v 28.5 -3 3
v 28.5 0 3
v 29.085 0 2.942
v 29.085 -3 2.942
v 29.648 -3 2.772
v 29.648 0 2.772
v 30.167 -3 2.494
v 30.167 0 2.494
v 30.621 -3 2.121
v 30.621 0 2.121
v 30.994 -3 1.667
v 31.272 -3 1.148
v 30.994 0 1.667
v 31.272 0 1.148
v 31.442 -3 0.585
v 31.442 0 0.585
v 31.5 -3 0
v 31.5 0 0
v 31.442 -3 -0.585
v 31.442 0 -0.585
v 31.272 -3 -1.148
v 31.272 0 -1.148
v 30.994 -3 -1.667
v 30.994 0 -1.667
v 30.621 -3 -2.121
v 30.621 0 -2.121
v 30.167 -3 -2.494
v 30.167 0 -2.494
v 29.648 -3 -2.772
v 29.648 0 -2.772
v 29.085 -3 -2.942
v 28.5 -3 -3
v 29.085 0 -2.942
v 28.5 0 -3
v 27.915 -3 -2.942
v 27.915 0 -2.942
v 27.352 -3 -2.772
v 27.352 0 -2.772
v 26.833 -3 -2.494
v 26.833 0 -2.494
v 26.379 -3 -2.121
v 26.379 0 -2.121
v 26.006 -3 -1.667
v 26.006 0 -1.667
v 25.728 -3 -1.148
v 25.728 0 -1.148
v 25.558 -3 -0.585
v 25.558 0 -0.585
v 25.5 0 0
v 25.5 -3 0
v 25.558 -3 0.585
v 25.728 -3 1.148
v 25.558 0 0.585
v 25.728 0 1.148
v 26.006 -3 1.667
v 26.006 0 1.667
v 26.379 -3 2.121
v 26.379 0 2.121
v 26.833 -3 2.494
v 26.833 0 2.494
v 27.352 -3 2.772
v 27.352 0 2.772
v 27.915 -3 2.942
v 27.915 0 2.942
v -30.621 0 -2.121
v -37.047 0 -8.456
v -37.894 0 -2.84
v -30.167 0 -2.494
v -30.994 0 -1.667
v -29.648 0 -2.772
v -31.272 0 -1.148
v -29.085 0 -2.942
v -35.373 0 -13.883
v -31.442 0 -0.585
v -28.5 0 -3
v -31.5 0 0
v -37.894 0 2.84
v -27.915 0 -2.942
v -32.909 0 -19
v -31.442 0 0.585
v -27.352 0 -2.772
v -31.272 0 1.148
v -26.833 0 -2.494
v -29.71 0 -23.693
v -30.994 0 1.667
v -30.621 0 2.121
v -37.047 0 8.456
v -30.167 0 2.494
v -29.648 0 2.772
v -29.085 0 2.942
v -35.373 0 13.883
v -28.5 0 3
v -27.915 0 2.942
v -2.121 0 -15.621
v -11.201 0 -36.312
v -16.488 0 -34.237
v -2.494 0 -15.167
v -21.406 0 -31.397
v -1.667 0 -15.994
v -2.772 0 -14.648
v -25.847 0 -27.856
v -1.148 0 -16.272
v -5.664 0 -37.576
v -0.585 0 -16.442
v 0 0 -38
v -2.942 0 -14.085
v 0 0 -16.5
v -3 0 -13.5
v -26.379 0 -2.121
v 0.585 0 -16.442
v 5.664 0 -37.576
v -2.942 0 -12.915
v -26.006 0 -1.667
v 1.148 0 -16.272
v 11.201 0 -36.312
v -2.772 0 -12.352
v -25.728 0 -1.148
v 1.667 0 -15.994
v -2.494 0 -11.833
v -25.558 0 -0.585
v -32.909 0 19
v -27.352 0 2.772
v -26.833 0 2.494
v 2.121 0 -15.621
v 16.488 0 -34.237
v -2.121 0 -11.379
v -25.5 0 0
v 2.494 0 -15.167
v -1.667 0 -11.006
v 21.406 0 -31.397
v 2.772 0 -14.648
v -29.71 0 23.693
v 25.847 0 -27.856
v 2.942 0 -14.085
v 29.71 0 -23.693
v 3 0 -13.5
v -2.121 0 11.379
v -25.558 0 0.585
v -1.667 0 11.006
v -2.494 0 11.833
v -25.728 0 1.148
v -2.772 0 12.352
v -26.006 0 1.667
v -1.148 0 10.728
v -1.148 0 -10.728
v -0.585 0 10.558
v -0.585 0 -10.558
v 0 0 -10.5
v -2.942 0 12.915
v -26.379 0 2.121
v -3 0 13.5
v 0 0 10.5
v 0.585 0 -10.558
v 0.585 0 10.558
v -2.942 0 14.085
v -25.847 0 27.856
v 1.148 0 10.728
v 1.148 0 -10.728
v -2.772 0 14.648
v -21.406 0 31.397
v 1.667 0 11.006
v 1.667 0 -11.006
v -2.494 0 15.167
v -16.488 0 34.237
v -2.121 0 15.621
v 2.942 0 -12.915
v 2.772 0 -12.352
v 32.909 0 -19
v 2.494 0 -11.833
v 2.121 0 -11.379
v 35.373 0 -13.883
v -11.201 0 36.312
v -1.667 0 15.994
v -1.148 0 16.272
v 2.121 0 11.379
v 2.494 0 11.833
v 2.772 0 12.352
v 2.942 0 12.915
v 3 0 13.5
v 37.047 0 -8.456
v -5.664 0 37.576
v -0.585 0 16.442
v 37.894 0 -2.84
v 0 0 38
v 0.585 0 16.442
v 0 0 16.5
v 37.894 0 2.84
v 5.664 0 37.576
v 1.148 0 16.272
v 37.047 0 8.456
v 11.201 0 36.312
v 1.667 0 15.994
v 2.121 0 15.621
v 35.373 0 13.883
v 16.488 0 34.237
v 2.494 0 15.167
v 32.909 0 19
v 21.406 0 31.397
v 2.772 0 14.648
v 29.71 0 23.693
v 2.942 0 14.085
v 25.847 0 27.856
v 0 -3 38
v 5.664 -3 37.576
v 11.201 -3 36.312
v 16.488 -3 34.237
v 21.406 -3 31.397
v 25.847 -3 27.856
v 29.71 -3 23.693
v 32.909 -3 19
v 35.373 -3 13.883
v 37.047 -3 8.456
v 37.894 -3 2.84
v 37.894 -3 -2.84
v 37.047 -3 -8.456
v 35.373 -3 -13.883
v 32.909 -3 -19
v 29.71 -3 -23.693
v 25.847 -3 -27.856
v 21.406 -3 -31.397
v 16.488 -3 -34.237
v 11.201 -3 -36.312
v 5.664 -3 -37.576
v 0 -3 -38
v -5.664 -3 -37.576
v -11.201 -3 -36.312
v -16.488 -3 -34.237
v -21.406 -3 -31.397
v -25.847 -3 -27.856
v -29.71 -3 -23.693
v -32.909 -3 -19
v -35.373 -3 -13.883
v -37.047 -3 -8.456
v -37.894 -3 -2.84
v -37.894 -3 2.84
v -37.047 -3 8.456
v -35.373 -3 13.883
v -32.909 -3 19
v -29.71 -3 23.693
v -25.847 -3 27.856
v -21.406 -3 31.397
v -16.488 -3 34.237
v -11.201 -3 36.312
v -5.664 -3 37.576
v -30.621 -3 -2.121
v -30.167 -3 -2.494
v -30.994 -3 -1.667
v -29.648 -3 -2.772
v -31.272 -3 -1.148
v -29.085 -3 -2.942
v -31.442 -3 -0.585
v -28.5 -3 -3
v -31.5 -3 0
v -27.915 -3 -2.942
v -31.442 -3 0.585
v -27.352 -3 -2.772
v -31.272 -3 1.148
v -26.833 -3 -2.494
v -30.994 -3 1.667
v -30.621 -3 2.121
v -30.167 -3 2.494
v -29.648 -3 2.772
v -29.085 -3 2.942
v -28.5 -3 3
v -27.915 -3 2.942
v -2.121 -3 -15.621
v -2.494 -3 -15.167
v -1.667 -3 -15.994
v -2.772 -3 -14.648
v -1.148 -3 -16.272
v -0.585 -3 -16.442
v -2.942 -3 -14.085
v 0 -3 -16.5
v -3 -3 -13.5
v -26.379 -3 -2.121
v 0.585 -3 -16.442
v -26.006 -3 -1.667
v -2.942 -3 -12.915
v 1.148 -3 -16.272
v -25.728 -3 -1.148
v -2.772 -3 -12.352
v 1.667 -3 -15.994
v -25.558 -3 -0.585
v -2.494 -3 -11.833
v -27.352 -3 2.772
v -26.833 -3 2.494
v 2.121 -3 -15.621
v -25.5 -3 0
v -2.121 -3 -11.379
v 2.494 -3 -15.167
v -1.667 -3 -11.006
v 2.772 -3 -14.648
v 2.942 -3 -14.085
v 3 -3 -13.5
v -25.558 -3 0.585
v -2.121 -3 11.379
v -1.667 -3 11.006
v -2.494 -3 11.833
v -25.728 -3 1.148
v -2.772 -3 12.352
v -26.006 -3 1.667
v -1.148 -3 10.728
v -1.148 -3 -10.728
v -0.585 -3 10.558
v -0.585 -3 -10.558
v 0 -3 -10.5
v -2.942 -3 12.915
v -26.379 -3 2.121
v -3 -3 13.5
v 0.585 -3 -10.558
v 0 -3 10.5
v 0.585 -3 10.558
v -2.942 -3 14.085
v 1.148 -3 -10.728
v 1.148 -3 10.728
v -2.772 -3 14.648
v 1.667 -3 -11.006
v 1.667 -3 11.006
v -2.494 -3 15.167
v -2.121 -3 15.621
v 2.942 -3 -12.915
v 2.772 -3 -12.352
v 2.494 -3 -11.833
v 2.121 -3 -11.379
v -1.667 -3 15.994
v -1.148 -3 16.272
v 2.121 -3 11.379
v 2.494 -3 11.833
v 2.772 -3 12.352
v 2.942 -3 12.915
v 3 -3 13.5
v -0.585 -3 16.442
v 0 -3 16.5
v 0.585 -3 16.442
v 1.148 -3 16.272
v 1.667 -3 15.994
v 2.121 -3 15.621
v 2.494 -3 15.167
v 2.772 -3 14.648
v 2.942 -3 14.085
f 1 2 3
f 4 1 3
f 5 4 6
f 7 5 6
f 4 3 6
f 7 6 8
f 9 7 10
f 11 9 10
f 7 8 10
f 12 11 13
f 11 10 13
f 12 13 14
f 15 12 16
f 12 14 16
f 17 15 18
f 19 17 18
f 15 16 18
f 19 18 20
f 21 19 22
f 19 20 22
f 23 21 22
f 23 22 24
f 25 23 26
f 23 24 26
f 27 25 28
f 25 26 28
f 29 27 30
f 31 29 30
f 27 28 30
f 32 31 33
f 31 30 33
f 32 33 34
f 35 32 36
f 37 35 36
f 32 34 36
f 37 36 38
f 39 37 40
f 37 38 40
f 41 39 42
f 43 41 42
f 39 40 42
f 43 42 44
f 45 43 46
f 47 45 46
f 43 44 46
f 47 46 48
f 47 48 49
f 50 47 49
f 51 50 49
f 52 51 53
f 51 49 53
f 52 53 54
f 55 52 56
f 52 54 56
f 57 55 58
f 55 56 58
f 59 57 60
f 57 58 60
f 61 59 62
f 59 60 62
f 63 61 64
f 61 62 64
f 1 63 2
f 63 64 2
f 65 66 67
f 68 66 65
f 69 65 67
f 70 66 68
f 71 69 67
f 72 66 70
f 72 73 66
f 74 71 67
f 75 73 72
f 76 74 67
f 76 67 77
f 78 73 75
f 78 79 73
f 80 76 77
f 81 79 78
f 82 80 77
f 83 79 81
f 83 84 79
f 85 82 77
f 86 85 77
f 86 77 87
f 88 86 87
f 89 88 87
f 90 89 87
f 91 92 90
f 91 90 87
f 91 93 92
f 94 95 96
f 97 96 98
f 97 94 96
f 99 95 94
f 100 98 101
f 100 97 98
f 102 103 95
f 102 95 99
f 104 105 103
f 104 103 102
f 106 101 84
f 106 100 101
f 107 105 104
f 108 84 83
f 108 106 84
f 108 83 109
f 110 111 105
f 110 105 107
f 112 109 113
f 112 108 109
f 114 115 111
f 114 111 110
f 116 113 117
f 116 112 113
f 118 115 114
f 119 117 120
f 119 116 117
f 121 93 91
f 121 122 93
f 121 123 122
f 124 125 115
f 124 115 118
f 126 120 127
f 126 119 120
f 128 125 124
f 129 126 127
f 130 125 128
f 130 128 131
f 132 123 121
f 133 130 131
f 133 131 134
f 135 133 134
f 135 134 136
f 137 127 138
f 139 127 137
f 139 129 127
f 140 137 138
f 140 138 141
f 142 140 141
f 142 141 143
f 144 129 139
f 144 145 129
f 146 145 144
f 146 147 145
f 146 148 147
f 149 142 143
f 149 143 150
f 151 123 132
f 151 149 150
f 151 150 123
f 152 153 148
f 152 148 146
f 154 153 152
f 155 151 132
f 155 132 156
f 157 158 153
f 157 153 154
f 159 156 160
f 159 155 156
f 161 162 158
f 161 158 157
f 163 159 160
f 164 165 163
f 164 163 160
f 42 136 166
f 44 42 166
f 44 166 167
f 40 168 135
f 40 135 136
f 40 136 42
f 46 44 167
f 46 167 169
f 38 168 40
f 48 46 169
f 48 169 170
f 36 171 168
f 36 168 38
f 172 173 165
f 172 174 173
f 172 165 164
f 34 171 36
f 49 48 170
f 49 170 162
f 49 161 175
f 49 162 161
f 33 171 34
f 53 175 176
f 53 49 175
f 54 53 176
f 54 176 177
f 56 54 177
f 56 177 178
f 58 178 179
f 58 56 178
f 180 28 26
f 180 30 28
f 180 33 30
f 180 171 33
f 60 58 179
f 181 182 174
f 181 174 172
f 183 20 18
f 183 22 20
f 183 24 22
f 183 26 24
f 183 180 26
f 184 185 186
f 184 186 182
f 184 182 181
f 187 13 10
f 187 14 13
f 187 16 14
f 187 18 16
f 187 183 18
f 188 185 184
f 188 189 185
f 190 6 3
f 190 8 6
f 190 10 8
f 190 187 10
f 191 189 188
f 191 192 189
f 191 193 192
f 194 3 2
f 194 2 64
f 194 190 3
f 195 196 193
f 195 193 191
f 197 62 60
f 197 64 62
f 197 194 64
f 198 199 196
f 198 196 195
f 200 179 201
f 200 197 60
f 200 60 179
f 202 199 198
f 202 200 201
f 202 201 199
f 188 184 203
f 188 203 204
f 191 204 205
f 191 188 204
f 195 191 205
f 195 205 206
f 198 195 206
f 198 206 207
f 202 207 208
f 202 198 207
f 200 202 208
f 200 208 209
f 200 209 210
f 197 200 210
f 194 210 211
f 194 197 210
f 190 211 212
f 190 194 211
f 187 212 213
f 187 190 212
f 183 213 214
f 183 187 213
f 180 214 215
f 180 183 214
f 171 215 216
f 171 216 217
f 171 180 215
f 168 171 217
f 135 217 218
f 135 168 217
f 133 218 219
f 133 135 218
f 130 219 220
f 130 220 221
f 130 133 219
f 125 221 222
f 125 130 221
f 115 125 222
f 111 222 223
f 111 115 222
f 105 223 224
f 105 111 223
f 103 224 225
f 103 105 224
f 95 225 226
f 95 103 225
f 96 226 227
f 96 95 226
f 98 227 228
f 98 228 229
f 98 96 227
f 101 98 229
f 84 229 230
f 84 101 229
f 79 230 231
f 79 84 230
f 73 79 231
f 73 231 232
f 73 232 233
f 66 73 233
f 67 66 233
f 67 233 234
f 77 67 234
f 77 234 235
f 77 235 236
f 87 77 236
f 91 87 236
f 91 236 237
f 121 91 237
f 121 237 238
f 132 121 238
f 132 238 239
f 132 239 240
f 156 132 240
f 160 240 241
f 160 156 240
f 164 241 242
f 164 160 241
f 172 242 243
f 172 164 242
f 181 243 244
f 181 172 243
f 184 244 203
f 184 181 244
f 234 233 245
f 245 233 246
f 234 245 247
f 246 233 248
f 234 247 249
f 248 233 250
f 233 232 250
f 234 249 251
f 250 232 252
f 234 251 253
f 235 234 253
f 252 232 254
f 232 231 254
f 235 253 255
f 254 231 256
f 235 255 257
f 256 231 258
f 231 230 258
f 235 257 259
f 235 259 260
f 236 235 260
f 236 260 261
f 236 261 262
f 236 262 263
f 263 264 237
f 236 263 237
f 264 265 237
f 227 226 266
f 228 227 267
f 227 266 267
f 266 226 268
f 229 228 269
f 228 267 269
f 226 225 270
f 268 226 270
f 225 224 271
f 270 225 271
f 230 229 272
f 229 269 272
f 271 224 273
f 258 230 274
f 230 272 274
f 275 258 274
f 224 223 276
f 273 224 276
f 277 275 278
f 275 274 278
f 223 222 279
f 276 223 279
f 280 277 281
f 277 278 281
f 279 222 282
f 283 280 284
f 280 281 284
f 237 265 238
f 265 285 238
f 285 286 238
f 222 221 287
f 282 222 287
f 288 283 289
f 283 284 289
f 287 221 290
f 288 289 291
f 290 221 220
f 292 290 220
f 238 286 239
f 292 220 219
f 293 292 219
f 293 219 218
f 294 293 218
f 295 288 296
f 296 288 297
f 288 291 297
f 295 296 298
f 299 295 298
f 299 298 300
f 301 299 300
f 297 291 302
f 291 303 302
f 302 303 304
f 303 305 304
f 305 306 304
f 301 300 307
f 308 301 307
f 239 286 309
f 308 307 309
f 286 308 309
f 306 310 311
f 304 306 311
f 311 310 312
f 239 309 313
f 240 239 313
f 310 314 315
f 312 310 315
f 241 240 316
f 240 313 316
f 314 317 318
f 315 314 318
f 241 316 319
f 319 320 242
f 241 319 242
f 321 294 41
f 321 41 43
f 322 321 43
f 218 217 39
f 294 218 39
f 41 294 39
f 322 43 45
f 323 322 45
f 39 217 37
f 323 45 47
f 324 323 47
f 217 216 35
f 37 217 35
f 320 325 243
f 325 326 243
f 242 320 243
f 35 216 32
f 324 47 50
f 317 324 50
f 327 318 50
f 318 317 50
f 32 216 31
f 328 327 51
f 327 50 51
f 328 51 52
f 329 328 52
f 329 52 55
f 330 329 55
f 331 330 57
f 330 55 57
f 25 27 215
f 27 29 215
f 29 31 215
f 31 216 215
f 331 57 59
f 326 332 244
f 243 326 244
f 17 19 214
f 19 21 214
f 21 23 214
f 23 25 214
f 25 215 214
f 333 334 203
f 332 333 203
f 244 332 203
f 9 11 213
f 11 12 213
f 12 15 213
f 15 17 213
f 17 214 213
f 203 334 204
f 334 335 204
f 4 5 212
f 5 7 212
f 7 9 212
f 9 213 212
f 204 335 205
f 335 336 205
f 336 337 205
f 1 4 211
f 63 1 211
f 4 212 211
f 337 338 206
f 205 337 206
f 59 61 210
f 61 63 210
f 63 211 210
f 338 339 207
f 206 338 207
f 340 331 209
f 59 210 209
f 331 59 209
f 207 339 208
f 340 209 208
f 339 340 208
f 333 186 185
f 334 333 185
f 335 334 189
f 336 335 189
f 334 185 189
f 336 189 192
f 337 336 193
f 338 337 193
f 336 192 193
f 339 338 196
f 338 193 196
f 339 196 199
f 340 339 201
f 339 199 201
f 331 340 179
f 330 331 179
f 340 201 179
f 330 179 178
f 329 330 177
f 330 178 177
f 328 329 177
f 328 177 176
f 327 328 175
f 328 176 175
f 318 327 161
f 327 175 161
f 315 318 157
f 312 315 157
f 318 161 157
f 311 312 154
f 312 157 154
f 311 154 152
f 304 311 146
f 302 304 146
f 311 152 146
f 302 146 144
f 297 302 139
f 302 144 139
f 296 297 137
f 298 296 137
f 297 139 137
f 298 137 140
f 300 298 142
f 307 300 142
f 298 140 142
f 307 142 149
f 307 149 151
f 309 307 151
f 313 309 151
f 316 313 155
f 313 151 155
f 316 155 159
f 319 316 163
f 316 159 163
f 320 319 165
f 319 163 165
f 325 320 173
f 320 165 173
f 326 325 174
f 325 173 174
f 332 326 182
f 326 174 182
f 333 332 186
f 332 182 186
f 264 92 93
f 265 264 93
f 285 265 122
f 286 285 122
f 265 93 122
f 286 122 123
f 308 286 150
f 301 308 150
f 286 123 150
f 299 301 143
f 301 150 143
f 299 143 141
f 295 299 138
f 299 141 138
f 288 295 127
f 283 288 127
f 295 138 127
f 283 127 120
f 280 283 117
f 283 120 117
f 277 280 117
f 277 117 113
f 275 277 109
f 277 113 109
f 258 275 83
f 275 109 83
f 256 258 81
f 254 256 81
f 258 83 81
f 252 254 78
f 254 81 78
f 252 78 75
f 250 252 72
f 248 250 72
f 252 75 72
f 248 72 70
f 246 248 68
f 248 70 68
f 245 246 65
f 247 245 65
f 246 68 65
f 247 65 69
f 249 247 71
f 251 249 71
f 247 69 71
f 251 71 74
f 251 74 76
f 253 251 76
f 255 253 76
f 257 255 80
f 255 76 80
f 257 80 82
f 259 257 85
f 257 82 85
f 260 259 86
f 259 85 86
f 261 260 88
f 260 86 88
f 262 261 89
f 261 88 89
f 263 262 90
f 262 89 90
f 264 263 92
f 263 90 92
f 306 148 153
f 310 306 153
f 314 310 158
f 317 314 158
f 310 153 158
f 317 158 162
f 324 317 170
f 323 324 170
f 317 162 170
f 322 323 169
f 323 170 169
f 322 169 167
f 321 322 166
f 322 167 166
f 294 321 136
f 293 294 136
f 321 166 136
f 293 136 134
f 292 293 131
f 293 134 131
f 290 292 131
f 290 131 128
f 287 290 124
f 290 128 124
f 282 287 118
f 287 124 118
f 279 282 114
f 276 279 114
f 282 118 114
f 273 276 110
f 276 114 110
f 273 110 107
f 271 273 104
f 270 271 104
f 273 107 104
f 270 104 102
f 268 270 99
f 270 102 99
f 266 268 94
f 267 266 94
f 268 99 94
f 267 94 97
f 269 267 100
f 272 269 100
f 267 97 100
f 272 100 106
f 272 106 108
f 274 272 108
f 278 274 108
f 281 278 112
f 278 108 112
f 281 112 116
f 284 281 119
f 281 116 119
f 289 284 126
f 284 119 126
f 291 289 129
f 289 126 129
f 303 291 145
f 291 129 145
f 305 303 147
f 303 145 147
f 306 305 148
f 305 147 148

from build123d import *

# Parameters (mm, degrees)
SKETCH1_R           = 38
SKETCH1_R_2         = 3
BOSS_EXTRUDE1_DEPTH = 3


with BuildPart() as part:
    # Sketch1 → Boss-Extrude1 (new body)
    with BuildSketch(Plane(origin=(0, 0, 0), x_dir=(1, 0, 0), z_dir=(0, 1, 0))):
        with Locations(Location((0, 0, 0), (0, 0, 270))):
            Circle(SKETCH1_R)
        with Locations(Location((28.5, 0, 0), (0, 0, 270))):
            Circle(SKETCH1_R_2, mode=Mode.SUBTRACT)
        with Locations(Location((-28.5, 0, 0), (0, 0, 270))):
            Circle(SKETCH1_R_2, mode=Mode.SUBTRACT)
        with Locations(Location((0, 13.5, 0), (0, 0, 270))):
            Circle(SKETCH1_R_2, mode=Mode.SUBTRACT)
        with Locations(Location((0, -13.5, 0), (0, 0, 270))):
            Circle(SKETCH1_R_2, mode=Mode.SUBTRACT)
    extrude(amount=-BOSS_EXTRUDE1_DEPTH)


solid = part.part
